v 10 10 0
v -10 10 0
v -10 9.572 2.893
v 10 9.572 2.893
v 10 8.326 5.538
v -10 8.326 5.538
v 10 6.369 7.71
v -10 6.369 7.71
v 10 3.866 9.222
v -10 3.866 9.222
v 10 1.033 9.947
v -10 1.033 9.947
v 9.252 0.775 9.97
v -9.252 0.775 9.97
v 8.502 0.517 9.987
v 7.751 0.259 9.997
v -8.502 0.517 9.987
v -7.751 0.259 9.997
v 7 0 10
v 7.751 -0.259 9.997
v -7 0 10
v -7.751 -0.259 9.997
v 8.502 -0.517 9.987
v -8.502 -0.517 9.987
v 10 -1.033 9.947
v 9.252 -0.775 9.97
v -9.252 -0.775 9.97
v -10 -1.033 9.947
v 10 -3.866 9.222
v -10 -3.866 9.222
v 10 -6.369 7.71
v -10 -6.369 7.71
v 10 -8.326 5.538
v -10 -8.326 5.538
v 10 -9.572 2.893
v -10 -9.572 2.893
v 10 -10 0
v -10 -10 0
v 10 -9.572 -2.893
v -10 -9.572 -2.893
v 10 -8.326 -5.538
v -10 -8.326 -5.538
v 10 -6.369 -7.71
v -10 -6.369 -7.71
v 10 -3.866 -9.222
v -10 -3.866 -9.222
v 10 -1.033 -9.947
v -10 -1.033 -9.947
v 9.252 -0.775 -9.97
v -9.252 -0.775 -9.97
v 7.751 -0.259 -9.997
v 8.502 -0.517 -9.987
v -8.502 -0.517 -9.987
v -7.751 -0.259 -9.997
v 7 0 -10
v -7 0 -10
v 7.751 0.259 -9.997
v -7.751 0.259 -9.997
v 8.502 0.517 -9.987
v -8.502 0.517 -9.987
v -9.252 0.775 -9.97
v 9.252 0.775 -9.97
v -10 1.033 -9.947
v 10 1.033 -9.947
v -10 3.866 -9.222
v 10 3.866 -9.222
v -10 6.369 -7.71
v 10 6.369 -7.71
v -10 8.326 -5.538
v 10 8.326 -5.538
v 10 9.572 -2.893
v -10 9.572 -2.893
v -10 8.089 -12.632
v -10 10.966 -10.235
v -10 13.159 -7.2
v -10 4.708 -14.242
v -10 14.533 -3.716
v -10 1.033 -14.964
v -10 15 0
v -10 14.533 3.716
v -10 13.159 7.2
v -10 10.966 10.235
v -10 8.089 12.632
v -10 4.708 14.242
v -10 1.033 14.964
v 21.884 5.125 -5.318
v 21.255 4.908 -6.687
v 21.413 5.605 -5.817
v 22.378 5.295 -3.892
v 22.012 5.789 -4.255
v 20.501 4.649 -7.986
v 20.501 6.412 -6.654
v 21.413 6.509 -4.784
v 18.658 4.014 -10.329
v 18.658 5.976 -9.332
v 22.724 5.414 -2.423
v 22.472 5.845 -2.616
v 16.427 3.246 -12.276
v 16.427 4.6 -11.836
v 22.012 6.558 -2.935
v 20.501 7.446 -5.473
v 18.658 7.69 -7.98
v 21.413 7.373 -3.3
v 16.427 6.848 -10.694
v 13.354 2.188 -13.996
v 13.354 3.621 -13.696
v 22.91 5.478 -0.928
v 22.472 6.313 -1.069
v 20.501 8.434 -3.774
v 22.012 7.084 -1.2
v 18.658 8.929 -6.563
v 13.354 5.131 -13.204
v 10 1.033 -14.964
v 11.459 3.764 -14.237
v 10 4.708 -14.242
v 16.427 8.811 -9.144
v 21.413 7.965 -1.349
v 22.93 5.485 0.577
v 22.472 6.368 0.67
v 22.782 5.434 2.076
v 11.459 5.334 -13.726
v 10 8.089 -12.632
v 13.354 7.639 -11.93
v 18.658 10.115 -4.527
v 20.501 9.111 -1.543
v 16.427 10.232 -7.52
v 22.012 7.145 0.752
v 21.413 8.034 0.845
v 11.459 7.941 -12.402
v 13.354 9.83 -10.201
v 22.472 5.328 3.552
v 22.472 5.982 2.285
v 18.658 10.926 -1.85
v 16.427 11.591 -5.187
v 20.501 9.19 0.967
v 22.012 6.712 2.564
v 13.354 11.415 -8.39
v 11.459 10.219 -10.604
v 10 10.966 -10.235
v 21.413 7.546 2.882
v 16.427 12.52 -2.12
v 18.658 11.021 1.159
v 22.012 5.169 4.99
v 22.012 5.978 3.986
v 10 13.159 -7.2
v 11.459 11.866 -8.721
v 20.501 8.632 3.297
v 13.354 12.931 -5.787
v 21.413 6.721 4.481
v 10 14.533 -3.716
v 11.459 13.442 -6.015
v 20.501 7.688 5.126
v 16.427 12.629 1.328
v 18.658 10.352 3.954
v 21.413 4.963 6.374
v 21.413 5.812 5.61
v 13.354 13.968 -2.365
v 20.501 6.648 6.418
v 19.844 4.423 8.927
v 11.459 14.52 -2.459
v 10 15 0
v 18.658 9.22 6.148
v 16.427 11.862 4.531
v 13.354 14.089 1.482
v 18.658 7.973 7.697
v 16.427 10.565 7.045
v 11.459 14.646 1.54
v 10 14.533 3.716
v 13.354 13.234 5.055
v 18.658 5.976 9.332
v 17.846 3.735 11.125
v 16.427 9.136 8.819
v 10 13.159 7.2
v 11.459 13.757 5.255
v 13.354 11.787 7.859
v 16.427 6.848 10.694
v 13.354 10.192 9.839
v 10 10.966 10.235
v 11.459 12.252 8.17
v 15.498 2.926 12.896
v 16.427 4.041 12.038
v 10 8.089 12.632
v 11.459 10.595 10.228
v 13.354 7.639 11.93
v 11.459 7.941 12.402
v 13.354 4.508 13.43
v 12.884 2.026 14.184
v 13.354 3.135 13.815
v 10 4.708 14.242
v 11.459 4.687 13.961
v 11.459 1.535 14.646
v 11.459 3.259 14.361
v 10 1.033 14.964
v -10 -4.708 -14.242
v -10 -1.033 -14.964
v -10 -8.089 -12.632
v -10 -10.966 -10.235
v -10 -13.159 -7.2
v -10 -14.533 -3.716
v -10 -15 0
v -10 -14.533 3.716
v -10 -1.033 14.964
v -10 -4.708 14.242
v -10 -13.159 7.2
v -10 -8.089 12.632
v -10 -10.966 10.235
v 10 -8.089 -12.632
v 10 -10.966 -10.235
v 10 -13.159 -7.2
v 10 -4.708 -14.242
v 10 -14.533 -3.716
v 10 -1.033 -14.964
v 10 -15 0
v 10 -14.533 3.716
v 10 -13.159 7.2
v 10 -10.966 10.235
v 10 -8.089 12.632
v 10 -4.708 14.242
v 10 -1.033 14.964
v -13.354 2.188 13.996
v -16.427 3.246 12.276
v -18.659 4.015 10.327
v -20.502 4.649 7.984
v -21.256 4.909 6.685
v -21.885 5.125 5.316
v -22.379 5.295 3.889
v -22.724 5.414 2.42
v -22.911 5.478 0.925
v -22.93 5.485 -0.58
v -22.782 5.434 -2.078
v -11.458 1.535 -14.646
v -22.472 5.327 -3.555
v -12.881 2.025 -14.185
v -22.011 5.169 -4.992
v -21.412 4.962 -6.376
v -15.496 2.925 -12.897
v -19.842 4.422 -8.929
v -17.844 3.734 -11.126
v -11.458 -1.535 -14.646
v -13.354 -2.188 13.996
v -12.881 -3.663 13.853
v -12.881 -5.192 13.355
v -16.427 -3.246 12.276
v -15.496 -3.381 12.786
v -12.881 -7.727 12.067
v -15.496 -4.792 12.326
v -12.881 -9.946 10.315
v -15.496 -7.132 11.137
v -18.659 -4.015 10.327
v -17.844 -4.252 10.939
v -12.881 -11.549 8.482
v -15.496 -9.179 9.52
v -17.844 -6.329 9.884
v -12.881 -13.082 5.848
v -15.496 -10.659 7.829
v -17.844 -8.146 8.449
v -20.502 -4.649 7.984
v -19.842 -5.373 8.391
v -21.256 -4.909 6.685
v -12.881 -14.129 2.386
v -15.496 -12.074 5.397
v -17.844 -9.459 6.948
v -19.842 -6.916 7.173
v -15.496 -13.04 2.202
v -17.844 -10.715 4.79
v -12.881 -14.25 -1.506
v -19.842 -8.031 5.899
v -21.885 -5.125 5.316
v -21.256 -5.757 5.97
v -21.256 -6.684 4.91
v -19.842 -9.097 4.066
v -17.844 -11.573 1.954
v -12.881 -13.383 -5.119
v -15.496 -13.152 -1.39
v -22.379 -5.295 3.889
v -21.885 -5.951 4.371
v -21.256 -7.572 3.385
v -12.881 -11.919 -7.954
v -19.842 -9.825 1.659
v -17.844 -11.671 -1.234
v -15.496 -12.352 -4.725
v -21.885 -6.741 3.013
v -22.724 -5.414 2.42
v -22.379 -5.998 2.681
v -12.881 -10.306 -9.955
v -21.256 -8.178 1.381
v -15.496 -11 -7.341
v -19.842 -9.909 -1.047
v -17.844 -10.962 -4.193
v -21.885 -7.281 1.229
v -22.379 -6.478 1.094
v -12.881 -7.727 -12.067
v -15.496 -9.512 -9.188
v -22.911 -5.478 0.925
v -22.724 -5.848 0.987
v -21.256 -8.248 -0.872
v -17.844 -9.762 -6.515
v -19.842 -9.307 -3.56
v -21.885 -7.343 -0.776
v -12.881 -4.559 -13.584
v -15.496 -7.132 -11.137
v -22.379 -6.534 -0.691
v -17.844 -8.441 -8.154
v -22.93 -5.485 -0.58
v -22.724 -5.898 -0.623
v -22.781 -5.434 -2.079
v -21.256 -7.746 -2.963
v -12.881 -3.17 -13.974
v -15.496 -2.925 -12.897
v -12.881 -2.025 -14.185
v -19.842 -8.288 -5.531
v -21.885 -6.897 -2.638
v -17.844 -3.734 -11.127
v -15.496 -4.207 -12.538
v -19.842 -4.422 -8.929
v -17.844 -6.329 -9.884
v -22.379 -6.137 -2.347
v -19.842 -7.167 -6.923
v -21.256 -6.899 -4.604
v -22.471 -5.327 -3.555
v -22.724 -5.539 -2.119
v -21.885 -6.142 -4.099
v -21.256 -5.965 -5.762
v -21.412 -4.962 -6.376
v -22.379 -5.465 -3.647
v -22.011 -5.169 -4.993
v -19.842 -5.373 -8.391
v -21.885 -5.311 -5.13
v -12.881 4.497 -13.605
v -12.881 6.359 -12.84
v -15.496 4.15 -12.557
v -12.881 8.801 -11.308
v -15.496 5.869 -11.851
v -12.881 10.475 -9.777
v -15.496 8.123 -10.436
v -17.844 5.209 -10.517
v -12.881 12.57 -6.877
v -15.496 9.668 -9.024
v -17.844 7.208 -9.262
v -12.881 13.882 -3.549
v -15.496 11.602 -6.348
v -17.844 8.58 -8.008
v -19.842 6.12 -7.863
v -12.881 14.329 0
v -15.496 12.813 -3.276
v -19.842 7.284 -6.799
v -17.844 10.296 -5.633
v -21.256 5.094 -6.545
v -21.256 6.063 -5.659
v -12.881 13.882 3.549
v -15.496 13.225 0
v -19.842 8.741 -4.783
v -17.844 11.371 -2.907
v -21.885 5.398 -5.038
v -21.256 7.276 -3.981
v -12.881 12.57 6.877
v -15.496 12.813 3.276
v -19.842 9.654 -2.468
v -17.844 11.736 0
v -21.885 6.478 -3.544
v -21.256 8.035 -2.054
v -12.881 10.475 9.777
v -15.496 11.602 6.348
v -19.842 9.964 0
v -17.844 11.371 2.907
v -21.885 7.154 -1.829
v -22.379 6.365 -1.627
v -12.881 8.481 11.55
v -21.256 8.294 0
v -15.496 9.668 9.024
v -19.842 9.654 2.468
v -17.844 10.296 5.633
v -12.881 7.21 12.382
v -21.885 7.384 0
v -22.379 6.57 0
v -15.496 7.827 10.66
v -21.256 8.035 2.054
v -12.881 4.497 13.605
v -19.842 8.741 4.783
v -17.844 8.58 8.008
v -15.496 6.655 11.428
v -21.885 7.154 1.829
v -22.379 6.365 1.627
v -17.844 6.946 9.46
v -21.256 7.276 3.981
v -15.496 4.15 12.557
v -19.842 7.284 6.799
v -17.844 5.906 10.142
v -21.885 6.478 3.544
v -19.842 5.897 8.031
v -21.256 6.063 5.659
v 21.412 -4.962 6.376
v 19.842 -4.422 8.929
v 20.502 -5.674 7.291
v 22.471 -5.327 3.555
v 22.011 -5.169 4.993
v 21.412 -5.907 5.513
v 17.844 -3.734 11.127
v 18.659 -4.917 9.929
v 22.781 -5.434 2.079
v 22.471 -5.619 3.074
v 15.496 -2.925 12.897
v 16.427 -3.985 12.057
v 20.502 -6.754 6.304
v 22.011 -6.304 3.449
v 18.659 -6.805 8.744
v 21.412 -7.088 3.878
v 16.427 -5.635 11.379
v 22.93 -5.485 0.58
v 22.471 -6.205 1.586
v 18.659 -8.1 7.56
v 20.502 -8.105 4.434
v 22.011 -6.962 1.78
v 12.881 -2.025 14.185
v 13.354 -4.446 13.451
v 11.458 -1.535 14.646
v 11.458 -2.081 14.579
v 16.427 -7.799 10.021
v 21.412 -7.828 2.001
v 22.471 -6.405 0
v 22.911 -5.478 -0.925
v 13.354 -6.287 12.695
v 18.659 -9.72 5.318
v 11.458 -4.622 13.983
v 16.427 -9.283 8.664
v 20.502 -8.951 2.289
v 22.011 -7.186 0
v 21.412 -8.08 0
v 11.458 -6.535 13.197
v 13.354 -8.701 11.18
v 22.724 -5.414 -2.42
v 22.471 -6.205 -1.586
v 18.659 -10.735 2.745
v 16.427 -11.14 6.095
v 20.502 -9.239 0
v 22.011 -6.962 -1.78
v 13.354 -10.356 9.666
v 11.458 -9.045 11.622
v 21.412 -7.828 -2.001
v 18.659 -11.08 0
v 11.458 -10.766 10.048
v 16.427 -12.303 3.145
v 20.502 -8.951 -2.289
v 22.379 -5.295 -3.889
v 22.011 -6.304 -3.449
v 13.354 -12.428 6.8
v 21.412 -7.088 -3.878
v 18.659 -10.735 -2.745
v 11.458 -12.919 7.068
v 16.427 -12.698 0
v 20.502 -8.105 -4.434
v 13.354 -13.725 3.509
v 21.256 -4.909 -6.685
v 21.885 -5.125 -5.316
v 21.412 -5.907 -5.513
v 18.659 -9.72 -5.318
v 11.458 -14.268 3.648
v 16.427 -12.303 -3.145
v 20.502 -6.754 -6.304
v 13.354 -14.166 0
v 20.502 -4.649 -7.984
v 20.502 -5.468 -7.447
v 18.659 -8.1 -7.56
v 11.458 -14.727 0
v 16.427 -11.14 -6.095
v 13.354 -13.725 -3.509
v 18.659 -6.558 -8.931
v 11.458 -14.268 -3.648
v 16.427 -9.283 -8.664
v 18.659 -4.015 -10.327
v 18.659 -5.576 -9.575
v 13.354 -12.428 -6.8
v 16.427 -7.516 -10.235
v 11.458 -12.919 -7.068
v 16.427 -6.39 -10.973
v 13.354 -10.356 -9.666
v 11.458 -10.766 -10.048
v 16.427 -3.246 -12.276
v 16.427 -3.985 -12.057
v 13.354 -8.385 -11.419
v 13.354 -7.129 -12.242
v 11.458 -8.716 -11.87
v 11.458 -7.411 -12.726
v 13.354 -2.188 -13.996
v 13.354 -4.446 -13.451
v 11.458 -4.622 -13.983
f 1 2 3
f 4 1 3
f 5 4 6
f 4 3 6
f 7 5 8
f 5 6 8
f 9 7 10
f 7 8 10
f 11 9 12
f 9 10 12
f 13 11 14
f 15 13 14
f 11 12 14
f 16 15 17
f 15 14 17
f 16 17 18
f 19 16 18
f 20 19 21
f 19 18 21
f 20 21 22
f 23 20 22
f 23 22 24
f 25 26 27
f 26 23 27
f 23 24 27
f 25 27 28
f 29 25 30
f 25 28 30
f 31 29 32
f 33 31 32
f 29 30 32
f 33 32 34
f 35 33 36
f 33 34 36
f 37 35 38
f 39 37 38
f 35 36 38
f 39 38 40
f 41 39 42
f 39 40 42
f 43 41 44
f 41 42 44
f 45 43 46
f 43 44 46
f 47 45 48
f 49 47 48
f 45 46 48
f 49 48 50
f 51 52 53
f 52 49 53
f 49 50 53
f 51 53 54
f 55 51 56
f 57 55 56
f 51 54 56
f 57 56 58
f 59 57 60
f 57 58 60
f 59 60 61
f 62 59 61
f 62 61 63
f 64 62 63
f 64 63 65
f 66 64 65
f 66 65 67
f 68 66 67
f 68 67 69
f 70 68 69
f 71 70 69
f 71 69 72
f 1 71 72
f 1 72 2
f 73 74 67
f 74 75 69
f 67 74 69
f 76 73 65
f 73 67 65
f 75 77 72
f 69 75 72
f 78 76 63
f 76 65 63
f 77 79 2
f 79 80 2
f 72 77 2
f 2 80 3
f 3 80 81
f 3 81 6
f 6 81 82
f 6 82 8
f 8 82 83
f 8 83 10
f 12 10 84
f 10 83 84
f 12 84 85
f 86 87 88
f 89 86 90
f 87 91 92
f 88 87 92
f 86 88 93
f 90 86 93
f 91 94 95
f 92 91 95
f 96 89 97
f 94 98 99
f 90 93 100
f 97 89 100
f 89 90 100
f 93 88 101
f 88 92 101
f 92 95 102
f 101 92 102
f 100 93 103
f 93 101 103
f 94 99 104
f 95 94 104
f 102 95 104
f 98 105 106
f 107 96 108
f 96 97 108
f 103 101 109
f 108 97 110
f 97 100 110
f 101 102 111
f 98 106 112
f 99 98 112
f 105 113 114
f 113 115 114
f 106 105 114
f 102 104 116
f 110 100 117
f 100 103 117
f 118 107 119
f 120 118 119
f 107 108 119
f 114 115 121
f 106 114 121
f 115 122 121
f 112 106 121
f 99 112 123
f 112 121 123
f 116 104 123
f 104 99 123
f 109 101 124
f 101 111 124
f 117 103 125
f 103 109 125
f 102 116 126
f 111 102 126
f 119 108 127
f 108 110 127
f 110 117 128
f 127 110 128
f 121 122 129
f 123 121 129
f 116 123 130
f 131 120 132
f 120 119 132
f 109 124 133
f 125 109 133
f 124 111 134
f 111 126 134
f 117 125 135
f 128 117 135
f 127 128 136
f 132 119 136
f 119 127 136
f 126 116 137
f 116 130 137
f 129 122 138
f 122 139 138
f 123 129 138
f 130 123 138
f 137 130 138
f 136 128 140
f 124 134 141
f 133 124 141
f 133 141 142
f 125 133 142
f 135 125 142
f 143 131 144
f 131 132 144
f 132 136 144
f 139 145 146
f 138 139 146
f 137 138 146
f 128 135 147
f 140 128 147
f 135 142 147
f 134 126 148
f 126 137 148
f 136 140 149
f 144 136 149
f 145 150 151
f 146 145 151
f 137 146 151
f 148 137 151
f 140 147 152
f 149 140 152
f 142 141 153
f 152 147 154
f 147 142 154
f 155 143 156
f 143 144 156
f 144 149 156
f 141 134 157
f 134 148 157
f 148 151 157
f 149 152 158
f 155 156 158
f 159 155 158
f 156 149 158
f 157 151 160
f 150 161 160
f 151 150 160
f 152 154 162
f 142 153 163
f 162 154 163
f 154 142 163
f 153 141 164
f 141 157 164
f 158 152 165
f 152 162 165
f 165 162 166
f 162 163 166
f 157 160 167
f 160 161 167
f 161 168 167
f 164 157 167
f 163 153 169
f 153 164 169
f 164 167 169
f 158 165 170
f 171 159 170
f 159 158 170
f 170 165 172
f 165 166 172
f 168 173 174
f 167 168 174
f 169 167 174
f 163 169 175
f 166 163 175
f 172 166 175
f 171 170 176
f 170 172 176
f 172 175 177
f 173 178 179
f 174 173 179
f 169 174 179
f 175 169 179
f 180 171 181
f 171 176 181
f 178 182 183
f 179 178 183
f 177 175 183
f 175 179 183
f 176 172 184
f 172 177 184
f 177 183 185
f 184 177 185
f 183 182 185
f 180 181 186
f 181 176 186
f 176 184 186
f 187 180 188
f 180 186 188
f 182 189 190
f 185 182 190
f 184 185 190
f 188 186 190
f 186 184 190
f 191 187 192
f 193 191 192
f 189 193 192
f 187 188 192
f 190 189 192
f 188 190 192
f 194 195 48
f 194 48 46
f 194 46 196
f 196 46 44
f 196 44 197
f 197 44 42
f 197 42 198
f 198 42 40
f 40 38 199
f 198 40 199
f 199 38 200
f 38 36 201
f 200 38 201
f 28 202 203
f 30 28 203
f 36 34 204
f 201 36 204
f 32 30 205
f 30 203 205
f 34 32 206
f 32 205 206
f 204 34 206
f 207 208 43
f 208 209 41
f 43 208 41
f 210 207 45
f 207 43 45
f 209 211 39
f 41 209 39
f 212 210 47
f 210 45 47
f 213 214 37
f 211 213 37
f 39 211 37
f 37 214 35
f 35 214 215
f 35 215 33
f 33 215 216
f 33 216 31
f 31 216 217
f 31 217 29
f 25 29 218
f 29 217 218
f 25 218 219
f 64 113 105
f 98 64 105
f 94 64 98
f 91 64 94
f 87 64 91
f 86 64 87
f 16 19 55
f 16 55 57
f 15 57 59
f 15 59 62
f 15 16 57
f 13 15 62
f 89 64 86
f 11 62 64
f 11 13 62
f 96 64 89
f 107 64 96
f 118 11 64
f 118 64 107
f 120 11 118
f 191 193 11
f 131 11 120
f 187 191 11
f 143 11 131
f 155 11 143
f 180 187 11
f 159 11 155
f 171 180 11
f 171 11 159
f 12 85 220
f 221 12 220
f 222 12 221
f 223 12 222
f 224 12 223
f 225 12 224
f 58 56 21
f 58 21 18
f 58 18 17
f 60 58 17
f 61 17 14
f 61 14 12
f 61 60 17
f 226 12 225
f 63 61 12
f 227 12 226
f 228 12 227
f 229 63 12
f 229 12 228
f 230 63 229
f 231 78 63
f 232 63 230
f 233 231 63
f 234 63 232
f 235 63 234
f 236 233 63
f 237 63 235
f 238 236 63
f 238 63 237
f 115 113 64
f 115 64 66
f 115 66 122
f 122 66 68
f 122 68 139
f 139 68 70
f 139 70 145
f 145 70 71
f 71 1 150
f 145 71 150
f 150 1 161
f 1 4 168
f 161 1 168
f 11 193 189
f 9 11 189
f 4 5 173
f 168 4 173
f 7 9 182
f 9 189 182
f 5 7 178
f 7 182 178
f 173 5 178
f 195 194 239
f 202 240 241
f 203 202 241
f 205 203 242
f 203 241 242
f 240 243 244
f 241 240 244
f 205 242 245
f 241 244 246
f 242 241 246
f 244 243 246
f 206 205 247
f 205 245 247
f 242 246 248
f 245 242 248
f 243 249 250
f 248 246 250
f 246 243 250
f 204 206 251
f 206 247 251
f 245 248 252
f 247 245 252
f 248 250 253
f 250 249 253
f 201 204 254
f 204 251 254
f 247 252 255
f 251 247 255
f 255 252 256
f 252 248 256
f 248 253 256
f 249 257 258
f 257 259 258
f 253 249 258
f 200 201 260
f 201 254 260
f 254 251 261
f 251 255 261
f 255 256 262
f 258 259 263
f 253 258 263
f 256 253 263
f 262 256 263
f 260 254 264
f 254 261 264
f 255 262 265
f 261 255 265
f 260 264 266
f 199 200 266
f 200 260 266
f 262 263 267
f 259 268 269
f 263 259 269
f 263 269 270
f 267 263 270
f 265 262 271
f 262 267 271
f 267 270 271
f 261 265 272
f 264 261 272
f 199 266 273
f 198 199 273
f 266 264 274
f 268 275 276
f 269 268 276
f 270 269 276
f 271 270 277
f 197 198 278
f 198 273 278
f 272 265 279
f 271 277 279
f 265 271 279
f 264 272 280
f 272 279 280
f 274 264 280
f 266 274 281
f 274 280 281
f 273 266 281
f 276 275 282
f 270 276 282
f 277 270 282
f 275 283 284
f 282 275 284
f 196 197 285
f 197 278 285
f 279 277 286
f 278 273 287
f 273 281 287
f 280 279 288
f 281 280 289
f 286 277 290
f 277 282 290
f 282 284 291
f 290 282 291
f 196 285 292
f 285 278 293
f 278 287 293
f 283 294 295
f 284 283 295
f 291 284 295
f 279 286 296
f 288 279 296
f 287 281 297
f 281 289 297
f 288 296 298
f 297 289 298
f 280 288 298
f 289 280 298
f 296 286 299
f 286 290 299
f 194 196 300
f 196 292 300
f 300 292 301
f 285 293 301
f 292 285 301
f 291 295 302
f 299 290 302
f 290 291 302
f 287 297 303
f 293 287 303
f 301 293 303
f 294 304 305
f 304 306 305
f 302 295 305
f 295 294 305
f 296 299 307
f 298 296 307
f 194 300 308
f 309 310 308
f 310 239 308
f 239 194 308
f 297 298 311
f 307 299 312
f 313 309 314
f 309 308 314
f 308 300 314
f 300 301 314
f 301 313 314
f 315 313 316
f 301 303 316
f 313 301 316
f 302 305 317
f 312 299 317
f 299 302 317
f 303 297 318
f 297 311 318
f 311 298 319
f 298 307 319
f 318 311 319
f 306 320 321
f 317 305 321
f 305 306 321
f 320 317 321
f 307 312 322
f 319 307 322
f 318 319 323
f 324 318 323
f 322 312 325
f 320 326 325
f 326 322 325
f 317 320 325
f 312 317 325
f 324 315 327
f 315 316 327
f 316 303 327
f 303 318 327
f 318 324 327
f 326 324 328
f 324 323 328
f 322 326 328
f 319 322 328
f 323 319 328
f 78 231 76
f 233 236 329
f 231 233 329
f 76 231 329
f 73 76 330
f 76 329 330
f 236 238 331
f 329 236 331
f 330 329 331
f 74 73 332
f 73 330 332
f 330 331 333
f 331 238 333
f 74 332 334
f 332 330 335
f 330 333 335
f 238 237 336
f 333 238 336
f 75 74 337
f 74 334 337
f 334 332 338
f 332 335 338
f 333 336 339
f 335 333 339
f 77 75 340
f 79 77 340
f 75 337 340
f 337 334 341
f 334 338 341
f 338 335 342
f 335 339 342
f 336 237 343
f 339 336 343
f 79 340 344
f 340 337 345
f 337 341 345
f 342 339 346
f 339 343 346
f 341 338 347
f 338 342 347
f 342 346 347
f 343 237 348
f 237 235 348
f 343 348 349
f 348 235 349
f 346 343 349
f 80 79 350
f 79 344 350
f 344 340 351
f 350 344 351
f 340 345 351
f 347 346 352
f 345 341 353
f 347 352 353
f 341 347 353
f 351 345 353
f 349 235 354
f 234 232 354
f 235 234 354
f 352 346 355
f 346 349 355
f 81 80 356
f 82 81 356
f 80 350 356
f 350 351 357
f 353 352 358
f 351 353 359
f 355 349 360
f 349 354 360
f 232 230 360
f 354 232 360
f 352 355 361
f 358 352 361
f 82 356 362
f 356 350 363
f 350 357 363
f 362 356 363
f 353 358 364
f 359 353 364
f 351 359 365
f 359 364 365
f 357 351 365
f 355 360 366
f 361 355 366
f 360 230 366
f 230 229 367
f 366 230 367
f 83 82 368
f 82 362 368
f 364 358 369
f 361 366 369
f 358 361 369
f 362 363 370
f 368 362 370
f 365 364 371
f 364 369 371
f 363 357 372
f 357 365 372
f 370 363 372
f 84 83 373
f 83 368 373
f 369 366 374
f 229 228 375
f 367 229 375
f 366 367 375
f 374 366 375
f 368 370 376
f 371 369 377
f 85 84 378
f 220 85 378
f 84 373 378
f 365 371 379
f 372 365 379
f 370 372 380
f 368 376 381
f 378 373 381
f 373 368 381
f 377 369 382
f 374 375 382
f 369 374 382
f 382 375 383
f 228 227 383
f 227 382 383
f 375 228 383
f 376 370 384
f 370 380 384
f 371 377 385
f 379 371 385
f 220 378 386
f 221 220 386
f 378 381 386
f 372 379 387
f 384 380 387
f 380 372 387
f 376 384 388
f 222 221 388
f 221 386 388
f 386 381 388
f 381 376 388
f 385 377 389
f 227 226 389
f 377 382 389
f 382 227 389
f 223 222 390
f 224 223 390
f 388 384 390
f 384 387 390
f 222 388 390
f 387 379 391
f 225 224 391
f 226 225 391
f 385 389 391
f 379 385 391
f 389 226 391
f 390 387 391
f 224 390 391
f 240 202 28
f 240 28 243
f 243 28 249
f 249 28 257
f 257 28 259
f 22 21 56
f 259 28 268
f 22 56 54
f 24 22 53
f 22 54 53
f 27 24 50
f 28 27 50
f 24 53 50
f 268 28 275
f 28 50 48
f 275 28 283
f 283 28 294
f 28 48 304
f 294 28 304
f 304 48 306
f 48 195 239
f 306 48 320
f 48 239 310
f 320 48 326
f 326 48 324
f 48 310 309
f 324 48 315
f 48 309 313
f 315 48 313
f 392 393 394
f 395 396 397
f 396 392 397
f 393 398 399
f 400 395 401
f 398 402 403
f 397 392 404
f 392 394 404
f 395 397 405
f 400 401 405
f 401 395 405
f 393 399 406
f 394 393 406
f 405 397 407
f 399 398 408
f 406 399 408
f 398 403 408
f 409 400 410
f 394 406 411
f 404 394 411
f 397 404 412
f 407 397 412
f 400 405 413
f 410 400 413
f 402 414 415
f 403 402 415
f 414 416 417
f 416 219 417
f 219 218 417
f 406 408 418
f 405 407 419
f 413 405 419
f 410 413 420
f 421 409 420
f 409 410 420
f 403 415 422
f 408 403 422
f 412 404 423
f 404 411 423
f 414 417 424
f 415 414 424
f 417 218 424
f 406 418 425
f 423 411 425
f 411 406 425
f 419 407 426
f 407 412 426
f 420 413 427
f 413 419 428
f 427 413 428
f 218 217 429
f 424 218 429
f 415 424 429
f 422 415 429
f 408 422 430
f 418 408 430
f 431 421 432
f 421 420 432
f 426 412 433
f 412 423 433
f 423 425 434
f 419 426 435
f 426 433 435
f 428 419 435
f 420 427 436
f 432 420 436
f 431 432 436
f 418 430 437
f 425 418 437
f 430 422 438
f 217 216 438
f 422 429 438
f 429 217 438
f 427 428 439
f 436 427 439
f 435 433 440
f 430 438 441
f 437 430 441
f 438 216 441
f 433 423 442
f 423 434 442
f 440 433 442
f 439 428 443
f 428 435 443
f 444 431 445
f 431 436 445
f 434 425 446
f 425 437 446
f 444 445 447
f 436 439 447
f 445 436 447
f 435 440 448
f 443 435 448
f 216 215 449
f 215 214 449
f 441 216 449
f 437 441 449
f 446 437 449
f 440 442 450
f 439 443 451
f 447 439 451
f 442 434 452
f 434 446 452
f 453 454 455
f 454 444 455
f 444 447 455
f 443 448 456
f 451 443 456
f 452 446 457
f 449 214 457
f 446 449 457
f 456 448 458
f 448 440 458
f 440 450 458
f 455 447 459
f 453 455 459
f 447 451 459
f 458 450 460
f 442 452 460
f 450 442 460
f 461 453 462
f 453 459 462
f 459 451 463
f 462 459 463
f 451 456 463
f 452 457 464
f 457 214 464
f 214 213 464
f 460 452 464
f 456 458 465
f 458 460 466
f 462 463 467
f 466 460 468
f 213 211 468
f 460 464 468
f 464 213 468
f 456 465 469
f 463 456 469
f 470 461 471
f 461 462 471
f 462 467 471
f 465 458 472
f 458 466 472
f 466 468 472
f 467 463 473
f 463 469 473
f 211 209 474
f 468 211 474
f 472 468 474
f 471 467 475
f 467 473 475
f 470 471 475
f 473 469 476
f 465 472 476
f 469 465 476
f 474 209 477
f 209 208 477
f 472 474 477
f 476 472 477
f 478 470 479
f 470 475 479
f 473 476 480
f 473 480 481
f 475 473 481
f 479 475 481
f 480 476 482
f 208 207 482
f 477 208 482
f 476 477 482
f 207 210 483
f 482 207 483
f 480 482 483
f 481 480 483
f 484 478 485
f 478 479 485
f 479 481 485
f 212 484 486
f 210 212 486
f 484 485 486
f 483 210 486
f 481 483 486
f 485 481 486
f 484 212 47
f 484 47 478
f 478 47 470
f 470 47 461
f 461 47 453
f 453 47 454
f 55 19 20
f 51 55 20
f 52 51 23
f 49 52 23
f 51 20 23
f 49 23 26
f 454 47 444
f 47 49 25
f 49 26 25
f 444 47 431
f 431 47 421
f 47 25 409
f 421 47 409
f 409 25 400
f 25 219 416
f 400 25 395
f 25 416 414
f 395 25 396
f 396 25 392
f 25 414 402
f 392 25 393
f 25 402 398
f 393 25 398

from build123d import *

# Parameters (mm, degrees)
CUT_EXTRUDE1_DEPTH = 20


with BuildPart() as part:
    # Sketch1 → Revolve4 (revolve)
    with BuildSketch(Plane.XY):
        with BuildLine():
            Line((-10, 10), (-10, 15))
            ThreePointArc((-10, 15), (-19.821538313, 9.985820369), (-24.5, 0))
            Line((-24.5, 0), (-7, 0))
            Line((-7, 0), (7, 0))
            Line((7, 0), (24.5, 0))
            ThreePointArc((24.5, 0), (19.821538313, 9.985820369), (10, 15))
            Line((10, 15), (10, 10))
            Line((10, 10), (-10, 10))
        make_face()
    revolve(axis=Axis((-3.122498999, 0, 0), (1, 0, 0)))

    # Sketch2 → Cut-Extrude1 (cut, symmetric)
    with BuildSketch(Plane.XY):
        Polygon((-25, 0), (-7, 0), (-24.964852936, -6.185794935), align=None)
        Polygon((-24.964852936, 6.185794935), (-25, 0), (-7, 0), align=None)
        Polygon((25, 0), (7, 0), (24.964852936, 6.185794935), align=None)
        Polygon((25, 0), (7, 0), (24.964852936, -6.185794935), align=None)
    extrude(amount=CUT_EXTRUDE1_DEPTH, both=True, mode=Mode.SUBTRACT)


solid = part.part
